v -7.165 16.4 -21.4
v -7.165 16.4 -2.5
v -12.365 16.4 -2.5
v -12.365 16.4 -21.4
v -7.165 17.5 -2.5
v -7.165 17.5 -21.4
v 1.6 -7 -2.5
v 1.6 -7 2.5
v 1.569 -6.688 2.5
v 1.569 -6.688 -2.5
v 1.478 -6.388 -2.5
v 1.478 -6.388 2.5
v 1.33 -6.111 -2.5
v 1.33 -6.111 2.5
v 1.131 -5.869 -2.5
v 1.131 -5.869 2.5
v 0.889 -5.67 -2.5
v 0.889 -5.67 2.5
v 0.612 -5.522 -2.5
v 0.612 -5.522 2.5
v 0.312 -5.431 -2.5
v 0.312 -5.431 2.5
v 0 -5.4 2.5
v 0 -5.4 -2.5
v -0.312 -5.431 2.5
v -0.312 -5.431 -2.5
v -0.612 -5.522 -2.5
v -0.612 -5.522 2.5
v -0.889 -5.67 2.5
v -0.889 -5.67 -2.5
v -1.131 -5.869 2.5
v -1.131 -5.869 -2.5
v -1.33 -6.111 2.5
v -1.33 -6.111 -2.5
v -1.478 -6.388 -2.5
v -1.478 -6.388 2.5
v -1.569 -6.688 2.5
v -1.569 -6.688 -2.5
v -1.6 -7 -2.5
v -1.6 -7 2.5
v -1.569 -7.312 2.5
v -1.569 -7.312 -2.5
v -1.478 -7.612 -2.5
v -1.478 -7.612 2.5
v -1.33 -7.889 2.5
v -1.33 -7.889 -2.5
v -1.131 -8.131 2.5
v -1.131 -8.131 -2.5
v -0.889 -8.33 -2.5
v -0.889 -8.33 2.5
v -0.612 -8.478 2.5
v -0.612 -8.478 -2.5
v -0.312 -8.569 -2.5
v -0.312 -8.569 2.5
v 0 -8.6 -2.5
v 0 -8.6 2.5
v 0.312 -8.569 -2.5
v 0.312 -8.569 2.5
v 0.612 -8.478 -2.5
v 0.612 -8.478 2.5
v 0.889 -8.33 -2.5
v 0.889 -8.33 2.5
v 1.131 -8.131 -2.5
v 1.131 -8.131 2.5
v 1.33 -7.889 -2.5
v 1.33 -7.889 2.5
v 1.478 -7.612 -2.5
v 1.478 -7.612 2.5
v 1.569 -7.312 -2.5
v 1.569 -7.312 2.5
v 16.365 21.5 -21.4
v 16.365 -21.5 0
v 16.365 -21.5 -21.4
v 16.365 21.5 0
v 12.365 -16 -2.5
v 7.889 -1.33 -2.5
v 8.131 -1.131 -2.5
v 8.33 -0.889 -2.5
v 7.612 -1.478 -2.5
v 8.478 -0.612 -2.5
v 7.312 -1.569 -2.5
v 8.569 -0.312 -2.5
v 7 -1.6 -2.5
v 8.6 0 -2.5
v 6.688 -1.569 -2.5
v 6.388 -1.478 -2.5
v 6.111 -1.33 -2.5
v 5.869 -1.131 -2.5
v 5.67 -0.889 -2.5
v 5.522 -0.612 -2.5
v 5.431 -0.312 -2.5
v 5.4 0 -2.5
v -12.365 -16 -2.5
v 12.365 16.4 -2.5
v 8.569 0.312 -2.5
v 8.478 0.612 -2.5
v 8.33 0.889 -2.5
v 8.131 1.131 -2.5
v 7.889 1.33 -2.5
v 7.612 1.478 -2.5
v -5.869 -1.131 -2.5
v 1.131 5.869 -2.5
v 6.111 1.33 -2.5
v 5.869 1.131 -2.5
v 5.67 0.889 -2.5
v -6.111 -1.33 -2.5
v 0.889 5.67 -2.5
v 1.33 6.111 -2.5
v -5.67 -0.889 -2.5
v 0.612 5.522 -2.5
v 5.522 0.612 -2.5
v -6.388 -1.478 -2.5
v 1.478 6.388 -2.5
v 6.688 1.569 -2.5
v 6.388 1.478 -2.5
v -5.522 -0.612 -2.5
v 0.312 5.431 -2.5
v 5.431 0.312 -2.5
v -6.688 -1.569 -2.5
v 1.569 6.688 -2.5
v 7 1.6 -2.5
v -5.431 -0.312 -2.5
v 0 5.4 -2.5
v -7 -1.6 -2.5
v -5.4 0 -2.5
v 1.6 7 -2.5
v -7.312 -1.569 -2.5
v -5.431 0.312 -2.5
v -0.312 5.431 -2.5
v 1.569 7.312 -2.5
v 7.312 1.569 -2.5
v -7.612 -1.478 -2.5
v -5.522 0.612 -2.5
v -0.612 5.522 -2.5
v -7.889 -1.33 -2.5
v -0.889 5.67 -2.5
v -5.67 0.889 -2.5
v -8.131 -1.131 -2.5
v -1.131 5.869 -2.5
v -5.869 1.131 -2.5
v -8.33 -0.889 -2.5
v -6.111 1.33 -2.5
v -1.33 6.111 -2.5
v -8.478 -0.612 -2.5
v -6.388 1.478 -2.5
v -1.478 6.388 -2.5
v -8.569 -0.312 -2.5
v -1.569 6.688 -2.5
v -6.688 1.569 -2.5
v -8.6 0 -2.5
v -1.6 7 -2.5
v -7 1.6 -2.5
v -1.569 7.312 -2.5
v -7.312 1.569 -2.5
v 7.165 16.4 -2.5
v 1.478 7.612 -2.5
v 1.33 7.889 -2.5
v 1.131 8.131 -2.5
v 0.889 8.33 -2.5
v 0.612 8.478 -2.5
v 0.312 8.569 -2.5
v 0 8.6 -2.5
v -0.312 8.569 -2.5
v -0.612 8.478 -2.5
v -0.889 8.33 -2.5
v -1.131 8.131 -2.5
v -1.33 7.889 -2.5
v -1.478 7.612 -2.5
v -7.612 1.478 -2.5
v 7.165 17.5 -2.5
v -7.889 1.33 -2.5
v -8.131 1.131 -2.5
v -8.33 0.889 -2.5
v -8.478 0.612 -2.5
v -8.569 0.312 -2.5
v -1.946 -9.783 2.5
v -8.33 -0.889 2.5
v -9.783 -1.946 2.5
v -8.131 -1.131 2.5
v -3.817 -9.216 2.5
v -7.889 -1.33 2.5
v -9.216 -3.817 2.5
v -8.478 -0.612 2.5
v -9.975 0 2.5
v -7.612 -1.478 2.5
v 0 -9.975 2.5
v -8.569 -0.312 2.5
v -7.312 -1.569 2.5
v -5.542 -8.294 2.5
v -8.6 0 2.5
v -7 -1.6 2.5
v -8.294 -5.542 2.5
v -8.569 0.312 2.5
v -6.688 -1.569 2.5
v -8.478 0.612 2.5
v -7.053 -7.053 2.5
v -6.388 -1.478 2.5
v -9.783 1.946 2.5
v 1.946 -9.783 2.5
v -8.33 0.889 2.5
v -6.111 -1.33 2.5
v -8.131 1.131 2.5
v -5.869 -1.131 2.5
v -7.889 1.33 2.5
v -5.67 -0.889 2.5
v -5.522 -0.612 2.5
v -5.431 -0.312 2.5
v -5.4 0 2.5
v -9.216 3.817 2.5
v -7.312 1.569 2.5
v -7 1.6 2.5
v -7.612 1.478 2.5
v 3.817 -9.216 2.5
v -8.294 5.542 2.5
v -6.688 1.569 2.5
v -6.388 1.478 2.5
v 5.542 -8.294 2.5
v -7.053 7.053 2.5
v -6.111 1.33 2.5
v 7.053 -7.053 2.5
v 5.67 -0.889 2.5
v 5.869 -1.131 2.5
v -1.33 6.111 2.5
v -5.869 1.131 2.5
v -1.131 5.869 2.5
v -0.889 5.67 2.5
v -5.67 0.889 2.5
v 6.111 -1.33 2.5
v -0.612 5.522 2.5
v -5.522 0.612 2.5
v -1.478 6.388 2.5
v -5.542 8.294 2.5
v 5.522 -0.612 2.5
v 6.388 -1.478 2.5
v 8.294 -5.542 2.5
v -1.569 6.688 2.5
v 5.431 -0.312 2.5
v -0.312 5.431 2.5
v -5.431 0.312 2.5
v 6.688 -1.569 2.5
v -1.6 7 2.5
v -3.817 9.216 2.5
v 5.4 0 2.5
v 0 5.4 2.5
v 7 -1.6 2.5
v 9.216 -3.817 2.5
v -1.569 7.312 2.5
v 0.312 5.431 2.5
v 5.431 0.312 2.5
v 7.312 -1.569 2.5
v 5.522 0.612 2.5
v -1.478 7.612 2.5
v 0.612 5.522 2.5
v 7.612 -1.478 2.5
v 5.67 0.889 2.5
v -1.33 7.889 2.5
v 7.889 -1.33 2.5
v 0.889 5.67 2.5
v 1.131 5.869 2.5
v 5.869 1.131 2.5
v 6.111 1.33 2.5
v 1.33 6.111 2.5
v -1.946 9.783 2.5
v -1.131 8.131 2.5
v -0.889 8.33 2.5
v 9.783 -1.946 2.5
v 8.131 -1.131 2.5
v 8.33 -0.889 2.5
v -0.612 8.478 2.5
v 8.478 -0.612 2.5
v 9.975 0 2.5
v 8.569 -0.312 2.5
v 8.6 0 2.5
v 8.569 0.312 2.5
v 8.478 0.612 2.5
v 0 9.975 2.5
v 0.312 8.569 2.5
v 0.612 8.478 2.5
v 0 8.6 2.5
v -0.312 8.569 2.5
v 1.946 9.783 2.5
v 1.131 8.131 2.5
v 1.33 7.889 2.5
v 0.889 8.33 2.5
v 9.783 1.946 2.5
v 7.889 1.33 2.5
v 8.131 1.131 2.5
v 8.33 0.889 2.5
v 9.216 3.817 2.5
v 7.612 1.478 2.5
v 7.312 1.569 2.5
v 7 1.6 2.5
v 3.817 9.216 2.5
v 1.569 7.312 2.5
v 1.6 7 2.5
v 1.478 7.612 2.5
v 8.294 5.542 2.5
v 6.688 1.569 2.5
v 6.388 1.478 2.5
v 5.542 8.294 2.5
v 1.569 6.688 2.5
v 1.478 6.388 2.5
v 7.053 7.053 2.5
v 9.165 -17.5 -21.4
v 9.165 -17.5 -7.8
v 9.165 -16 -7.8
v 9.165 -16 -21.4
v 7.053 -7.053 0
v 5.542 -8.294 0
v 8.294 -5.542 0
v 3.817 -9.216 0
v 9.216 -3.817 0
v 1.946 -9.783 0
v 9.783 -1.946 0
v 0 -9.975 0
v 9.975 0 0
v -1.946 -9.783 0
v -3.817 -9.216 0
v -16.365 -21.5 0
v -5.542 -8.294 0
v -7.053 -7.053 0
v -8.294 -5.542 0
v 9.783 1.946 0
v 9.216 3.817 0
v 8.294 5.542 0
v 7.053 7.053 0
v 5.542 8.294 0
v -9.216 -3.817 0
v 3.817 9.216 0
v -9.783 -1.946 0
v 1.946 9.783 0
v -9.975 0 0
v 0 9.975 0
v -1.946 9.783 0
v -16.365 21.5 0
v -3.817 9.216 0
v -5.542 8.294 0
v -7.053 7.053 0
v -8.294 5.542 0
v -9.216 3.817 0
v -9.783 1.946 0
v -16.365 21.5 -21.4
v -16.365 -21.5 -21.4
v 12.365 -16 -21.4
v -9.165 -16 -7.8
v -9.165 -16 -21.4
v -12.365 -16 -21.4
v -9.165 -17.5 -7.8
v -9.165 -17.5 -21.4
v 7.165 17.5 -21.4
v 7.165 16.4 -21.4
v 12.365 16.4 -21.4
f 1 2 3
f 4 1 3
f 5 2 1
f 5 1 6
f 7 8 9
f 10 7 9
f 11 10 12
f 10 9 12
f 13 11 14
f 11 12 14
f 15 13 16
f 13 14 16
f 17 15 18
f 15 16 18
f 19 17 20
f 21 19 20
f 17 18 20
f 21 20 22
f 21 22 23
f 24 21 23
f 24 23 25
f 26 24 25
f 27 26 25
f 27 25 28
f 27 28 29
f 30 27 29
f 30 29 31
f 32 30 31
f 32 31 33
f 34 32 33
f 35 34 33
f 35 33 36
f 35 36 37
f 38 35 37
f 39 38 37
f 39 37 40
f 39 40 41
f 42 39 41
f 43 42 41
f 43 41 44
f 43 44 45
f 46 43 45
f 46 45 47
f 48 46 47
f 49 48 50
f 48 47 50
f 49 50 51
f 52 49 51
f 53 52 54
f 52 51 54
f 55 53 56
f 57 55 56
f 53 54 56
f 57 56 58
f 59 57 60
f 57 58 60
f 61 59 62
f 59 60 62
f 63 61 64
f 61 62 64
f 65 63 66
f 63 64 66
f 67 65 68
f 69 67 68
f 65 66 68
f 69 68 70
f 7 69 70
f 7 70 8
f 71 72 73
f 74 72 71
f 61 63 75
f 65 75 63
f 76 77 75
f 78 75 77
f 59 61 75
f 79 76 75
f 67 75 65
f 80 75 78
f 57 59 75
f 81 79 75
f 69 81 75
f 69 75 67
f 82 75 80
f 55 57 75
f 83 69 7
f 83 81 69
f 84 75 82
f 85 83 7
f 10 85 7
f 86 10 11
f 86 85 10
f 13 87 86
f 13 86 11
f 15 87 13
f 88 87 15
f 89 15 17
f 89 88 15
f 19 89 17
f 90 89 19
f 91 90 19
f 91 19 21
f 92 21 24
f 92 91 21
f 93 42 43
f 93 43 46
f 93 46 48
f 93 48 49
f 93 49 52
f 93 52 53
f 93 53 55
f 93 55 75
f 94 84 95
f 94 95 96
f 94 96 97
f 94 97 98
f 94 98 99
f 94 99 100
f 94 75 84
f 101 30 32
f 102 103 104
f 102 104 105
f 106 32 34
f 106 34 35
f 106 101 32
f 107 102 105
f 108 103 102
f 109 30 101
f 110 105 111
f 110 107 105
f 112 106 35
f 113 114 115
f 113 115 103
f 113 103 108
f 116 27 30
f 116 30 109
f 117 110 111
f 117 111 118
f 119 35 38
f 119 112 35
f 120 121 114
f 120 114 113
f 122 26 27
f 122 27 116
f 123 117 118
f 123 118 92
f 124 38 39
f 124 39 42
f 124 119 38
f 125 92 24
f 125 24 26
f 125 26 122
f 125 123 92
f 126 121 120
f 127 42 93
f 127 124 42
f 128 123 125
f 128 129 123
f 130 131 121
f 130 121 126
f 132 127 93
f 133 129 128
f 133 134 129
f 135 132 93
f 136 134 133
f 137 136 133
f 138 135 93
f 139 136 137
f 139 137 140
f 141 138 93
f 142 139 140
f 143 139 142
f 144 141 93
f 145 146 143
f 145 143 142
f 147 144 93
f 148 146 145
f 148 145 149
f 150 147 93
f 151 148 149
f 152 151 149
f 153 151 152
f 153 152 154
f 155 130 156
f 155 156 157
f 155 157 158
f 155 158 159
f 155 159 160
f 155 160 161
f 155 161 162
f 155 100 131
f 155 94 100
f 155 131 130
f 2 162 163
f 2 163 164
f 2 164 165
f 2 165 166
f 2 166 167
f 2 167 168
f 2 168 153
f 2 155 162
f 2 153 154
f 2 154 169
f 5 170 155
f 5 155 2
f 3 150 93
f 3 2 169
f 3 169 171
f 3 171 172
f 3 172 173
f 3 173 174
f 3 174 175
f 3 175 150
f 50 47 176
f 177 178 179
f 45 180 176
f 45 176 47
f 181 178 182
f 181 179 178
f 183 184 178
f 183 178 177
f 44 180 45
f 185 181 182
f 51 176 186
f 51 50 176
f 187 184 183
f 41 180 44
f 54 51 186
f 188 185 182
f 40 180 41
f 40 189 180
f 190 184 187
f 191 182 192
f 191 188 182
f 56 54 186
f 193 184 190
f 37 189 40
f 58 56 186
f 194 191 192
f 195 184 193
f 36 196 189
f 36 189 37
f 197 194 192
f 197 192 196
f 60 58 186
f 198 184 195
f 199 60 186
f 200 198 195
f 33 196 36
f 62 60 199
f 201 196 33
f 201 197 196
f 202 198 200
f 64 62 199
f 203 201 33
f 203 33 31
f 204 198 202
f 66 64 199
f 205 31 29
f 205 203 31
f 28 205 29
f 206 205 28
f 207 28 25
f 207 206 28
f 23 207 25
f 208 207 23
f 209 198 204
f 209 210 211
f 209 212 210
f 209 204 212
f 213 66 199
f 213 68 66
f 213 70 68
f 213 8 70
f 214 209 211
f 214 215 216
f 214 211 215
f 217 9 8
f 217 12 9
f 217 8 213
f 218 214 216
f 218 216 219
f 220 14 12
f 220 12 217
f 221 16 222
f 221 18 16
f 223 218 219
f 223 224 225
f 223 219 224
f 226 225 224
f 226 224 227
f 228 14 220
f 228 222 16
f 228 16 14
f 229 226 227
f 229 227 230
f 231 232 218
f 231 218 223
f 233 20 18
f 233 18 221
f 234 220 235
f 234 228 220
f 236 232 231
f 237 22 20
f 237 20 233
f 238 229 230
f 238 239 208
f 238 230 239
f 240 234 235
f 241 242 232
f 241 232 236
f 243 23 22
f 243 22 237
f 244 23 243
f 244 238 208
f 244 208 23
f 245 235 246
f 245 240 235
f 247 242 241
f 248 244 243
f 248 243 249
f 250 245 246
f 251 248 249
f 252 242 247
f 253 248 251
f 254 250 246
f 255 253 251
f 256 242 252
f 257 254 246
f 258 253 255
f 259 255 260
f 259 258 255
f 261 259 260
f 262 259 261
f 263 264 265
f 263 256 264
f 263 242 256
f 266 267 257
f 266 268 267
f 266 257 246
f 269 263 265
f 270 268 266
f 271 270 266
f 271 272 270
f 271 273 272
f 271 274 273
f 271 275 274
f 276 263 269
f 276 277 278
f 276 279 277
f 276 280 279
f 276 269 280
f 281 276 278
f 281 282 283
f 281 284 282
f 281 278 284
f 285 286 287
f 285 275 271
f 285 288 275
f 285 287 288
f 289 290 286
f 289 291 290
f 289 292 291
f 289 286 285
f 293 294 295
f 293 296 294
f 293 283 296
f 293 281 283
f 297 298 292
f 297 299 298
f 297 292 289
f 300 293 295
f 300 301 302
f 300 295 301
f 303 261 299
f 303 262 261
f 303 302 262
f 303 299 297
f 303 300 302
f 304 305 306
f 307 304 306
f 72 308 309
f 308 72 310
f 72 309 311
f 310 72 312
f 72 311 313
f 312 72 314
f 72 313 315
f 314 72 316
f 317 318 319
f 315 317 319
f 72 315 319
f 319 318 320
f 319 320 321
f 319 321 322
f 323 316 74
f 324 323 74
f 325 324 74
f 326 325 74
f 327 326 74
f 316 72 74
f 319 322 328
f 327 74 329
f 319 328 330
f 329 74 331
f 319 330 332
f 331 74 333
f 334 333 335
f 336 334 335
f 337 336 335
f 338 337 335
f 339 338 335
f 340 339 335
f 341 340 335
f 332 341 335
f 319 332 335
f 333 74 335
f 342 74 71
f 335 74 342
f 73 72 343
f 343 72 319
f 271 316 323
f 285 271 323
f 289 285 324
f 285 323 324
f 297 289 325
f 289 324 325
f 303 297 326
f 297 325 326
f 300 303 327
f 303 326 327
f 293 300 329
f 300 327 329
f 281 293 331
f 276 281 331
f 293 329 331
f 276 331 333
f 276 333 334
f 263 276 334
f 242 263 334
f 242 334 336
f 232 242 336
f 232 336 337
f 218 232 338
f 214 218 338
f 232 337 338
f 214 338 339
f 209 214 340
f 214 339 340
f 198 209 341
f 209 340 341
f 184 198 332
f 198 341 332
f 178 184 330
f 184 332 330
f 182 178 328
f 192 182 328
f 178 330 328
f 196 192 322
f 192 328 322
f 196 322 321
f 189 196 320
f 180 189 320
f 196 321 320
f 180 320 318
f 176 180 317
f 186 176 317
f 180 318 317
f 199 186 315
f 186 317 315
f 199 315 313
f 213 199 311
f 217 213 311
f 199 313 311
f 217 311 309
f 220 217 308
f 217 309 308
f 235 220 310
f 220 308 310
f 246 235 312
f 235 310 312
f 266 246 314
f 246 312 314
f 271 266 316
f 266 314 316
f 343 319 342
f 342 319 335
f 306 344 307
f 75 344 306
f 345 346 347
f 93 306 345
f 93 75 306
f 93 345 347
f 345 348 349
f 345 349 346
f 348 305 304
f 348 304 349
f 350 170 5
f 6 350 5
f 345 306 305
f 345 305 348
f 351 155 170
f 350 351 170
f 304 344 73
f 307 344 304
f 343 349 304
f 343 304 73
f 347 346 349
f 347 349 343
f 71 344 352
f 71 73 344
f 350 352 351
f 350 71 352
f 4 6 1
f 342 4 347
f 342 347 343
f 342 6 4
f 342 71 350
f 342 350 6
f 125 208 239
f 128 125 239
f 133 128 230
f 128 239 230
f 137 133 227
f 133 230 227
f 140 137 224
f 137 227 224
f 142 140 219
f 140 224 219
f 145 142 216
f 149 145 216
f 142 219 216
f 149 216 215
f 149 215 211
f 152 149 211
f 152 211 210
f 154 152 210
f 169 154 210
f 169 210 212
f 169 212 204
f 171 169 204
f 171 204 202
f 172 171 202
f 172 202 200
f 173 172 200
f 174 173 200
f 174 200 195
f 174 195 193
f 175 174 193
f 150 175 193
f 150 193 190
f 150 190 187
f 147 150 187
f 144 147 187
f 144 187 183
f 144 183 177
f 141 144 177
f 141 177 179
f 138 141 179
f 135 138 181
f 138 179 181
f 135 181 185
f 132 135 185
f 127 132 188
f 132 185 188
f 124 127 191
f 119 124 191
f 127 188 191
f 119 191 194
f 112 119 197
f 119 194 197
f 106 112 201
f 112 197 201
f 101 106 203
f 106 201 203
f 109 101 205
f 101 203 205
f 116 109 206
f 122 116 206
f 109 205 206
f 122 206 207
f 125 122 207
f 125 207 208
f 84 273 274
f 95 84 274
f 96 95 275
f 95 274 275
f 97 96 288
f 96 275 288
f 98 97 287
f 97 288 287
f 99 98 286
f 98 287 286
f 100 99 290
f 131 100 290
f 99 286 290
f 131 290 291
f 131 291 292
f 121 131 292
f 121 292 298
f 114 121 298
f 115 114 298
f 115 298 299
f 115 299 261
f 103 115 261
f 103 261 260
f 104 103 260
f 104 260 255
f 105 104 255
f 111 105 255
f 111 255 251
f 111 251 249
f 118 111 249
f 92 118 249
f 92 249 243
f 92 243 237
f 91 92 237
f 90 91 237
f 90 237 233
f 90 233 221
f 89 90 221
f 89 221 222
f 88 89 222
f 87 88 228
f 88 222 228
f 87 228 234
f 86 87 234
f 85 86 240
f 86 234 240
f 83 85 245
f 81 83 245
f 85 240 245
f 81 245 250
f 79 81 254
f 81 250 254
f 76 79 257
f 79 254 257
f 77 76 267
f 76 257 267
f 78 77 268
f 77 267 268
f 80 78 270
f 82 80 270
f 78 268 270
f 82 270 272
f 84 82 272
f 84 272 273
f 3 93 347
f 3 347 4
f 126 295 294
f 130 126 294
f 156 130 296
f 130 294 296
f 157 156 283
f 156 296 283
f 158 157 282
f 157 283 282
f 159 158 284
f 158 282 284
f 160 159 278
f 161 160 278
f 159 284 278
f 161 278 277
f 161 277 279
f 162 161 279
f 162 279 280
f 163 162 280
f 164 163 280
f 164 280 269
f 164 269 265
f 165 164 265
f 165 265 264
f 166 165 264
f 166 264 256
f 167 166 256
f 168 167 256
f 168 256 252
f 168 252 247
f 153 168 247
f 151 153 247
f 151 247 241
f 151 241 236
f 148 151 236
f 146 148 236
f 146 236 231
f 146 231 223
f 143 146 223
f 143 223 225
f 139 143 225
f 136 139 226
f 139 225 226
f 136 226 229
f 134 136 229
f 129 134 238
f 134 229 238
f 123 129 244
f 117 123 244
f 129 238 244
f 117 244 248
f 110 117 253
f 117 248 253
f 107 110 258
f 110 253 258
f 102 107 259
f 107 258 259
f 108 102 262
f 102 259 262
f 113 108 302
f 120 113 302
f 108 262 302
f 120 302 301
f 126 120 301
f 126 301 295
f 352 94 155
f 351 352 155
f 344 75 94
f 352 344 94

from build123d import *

# Parameters (mm, degrees)
SKETCH1_R           = 9.975
BOSS_EXTRUDE1_DEPTH = 2.5
SKETCH3_W           = 24.73
SKETCH3_H           = 35
BOSS_EXTRUDE4_DEPTH = 2.5
SKETCH3_5_W         = 32.73
SKETCH3_5_H         = 43
SKETCH3_5_W_2       = 24.73
SKETCH3_5_H_2       = 35
BOSS_EXTRUDE5_DEPTH = 21.4
SKETCH4_W           = 5.2
SKETCH4_H           = 1.1
SKETCH4_W_2         = 3.2
SKETCH4_H_2         = 1.5
BOSS_EXTRUDE6_DEPTH = 18.9
SKETCH6_W           = 18.33
SKETCH6_H           = 1.5
BOSS_EXTRUDE7_DEPTH = 5.3
SKETCH2_R           = 1.6
CUT_EXTRUDE1_DEPTH  = 37


with BuildPart() as part:
    # Sketch1 → Boss-Extrude1 (new body)
    with BuildSketch(Plane.XY):
        Circle(SKETCH1_R)
    extrude(amount=BOSS_EXTRUDE1_DEPTH)

    # Sketch3 → Boss-Extrude4 (add)
    with BuildSketch(Plane(origin=(0, 0, 0), x_dir=(-1, 0, 0), z_dir=(0, 0, -1))):
        Rectangle(SKETCH3_W, SKETCH3_H)
    extrude(amount=BOSS_EXTRUDE4_DEPTH)

    # Sketch3<5> → Boss-Extrude5 (add)
    with BuildSketch(Plane(origin=(0, 0, 0), x_dir=(-1, 0, 0), z_dir=(0, 0, -1))):
        Rectangle(SKETCH3_5_W, SKETCH3_5_H)
        Rectangle(SKETCH3_5_W_2, SKETCH3_5_H_2, mode=Mode.SUBTRACT)
    extrude(amount=BOSS_EXTRUDE5_DEPTH)

    # Sketch4 → Boss-Extrude6 (add)
    with BuildSketch(Plane(origin=(0, 0, -2.5), x_dir=(-1, 0, 0), z_dir=(0, 0, -1))):
        with Locations((9.765, 16.95)):
            Rectangle(SKETCH4_W, SKETCH4_H)
        with Locations((-9.765, 16.95)):
            Rectangle(SKETCH4_W, SKETCH4_H)
        with Locations((10.765, -16.75)):
            Rectangle(SKETCH4_W_2, SKETCH4_H_2)
        with Locations((-10.765, -16.75)):
            Rectangle(SKETCH4_W_2, SKETCH4_H_2)
    extrude(amount=BOSS_EXTRUDE6_DEPTH)

    # Sketch6 → Boss-Extrude7 (add)
    with BuildSketch(Plane(origin=(0, 0, -2.5), x_dir=(-1, 0, 0), z_dir=(0, 0, -1))):
        with Locations((0, -16.75)):
            Rectangle(SKETCH6_W, SKETCH6_H)
    extrude(amount=BOSS_EXTRUDE7_DEPTH)

    # Sketch2 → Cut-Extrude1 (cut)
    with BuildSketch(Plane.XY.offset(2.5)):
        with Locations((7, 0)):
            Circle(SKETCH2_R)
        with Locations((0, -7)):
            Circle(SKETCH2_R)
        with Locations((-7, 0)):
            Circle(SKETCH2_R)
        with Locations((0, 7)):
            Circle(SKETCH2_R)
    extrude(amount=-CUT_EXTRUDE1_DEPTH, mode=Mode.SUBTRACT)


solid = part.part
